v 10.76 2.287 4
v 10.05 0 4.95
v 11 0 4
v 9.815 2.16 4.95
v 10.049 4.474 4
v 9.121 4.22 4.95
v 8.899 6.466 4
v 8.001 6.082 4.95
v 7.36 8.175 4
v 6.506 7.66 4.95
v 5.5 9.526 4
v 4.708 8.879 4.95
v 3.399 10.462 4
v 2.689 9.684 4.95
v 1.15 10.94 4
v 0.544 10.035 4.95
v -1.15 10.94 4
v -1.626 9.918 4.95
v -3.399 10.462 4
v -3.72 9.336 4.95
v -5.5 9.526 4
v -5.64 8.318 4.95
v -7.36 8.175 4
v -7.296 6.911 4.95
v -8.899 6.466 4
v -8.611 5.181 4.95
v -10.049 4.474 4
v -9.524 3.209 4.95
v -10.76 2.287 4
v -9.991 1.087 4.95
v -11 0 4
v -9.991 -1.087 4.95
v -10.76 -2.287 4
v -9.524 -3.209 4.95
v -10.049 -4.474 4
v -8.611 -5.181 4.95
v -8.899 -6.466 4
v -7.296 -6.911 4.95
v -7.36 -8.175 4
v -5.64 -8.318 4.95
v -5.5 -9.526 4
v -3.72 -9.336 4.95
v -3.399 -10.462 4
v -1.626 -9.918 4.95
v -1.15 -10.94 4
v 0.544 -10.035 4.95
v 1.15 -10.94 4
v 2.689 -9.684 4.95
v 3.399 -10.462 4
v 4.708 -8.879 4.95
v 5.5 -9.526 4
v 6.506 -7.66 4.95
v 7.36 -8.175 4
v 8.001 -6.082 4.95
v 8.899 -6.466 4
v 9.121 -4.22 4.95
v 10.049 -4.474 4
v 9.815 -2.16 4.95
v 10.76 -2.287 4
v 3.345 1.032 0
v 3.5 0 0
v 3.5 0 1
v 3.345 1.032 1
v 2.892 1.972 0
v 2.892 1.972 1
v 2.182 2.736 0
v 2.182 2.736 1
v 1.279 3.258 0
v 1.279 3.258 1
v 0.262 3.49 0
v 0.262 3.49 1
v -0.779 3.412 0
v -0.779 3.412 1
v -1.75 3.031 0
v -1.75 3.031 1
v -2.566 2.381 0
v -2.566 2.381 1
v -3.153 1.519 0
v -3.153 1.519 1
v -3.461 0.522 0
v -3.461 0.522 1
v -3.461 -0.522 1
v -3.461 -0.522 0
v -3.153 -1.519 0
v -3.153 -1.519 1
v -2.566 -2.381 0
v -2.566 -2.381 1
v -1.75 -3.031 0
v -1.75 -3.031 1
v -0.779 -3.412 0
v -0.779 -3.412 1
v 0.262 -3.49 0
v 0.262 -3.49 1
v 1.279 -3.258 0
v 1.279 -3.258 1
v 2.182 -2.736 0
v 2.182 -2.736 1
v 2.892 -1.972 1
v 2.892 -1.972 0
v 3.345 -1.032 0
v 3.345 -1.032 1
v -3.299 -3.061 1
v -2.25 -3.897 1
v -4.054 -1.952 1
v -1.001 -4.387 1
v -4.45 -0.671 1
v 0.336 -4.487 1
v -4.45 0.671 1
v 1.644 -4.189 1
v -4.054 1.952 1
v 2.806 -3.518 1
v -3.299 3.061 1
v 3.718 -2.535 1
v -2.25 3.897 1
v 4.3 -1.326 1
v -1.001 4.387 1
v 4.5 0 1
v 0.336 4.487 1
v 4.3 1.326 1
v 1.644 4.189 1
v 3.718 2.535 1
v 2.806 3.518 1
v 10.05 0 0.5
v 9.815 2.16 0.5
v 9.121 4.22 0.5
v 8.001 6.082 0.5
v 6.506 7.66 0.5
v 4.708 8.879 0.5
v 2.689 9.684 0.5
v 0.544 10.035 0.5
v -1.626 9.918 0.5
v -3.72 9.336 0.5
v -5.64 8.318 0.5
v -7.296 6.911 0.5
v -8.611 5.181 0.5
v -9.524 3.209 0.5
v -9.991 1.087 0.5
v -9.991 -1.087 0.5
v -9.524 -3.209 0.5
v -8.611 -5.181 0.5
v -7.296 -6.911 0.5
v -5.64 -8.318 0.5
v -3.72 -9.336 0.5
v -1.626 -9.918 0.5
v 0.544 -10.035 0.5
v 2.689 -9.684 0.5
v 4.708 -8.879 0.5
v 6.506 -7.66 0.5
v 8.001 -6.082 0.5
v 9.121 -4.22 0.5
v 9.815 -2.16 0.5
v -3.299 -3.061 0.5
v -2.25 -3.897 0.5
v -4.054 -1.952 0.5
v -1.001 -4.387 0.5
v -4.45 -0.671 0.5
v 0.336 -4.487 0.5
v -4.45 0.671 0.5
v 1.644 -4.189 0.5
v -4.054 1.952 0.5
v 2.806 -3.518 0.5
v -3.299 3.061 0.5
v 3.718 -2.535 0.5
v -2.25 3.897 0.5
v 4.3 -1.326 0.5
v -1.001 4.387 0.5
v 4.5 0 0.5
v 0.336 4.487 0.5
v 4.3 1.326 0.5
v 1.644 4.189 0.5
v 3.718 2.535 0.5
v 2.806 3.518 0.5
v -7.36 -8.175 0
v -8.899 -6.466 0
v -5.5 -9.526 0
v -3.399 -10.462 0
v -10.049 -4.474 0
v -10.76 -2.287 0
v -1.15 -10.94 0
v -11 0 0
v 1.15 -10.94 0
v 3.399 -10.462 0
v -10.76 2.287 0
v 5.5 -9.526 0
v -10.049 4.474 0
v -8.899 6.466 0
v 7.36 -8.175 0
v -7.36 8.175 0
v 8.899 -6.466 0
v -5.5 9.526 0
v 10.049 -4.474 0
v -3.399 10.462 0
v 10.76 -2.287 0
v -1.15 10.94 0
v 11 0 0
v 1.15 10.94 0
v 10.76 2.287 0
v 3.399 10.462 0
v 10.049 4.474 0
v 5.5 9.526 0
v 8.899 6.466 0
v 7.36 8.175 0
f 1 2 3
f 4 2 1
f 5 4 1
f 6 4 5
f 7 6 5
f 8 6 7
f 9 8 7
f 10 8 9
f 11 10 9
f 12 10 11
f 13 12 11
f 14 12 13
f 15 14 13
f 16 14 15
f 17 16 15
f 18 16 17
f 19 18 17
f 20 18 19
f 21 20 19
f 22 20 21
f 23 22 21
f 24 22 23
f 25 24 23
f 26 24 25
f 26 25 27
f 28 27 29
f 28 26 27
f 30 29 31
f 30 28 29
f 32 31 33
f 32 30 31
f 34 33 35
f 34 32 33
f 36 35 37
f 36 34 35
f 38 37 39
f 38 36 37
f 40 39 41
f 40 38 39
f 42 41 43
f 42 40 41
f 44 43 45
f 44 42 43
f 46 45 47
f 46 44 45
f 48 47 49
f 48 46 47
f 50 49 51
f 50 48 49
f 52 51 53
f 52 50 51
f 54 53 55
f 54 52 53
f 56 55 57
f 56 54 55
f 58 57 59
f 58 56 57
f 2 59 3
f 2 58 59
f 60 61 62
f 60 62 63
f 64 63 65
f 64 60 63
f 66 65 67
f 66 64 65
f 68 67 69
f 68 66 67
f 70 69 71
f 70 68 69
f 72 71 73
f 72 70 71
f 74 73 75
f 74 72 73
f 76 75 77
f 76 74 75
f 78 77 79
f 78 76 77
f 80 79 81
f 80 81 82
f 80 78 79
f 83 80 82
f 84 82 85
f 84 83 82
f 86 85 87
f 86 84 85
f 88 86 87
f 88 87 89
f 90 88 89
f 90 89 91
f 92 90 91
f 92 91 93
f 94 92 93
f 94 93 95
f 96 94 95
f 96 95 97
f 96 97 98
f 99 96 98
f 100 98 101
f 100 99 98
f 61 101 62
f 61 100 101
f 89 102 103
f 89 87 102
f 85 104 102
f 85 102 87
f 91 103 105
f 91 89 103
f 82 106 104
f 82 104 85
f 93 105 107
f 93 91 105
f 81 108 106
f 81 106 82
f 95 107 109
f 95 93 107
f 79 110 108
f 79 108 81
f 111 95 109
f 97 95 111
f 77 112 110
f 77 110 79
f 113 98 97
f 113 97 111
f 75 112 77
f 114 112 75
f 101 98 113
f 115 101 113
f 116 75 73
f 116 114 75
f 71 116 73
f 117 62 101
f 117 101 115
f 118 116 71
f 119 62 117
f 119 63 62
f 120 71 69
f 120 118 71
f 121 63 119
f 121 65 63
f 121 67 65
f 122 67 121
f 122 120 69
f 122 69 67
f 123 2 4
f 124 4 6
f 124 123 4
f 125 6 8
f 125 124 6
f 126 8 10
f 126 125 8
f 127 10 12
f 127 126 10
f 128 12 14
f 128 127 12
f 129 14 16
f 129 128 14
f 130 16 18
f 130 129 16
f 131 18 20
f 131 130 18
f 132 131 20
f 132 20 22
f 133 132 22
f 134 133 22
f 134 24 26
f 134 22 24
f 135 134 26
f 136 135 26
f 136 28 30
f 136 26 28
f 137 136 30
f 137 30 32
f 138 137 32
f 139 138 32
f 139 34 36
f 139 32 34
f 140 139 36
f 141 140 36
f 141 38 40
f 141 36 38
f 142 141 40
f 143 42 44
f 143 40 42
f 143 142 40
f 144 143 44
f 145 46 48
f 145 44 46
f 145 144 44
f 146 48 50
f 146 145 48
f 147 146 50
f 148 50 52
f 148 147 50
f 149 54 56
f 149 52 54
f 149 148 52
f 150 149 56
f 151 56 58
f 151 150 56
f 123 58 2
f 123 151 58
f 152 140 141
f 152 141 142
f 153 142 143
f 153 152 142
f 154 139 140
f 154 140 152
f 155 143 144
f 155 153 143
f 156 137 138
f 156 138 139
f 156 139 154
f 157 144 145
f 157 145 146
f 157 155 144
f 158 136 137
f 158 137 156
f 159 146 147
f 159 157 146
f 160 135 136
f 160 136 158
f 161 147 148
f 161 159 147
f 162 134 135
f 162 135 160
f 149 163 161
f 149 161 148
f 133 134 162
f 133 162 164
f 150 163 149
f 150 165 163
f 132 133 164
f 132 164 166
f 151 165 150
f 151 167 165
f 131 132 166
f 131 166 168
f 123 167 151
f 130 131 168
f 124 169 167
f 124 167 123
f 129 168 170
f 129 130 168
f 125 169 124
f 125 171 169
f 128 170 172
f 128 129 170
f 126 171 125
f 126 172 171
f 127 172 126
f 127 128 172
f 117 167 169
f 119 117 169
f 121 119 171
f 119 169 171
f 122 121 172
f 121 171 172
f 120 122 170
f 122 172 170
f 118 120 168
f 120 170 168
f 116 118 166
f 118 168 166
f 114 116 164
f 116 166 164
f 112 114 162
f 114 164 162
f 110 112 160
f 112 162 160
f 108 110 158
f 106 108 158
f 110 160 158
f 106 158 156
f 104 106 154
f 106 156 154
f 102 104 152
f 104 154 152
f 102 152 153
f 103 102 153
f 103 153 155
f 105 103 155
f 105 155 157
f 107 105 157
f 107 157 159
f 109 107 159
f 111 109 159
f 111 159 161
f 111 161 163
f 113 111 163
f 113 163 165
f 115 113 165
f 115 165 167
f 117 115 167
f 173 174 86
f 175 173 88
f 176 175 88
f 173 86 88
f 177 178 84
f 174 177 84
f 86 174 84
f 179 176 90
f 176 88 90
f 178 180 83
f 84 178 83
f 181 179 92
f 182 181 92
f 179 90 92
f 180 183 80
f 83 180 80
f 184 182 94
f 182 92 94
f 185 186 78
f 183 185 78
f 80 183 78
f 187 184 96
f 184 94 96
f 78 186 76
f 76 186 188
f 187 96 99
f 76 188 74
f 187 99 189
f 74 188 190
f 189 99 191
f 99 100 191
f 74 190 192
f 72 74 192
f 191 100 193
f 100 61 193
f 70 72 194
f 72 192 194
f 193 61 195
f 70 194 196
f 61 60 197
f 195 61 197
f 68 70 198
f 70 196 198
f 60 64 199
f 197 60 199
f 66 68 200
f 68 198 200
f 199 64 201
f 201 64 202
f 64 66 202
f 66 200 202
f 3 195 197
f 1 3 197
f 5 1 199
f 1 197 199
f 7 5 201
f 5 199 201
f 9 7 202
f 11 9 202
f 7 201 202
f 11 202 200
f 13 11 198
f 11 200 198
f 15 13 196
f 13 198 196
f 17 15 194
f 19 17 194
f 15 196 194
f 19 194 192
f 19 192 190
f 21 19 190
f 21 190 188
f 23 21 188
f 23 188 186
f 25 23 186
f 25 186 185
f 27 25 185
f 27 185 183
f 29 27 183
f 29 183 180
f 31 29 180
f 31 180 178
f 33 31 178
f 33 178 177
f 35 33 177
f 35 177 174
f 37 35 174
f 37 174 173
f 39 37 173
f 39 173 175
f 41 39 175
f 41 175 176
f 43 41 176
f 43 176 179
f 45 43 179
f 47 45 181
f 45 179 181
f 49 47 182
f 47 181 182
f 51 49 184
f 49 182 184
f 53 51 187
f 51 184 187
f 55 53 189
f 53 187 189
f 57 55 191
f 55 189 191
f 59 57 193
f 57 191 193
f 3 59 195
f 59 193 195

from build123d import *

# Parameters (mm, degrees)
F0_R     = 11
F0_R_2   = 10.5
F0_R_3   = 10.05
F1_DEPTH = 5
F0_R_4   = 4.5
F6_DEPTH = 0.5
F0_R_5   = 3.5
F7_DEPTH = 1


# Not quite as in the source:
# - a fillet or chamfer that OpenCascade refuses, or shapes differently, is made with other operations: its cross-section is extruded or revolved along the edge and cut away or added


with BuildPart() as f1:
    # F0 (on Top) → F1 (new body)
    with BuildSketch(Plane.XY):
        Circle(F0_R)
        Circle(F0_R_2, mode=Mode.SUBTRACT)
        Circle(F0_R_2)
        Circle(F0_R_3, mode=Mode.SUBTRACT)
    extrude(amount=F1_DEPTH)

    # F5: chamfer of 1 on 1 edges, made by hand

    # F5_s1 → F5_t2 (revolve, cut)
    with BuildSketch(Plane.XZ):
        Polygon((11, 4), (10, 5), (11, 5), align=None)
    revolve(axis=Axis((0, 0, 5), (0, 0, 1)), mode=Mode.SUBTRACT)

    # F0 (on Top) → F6 (join)
    with BuildSketch(Plane.XY):
        Circle(F0_R_3)
        Circle(F0_R_4, mode=Mode.SUBTRACT)
    extrude(amount=F6_DEPTH)

    # F0 (on Top) → F7 (join)
    with BuildSketch(Plane.XY):
        Circle(F0_R_4)
        Circle(F0_R_5, mode=Mode.SUBTRACT)
    extrude(amount=F7_DEPTH)


solid = f1.part
